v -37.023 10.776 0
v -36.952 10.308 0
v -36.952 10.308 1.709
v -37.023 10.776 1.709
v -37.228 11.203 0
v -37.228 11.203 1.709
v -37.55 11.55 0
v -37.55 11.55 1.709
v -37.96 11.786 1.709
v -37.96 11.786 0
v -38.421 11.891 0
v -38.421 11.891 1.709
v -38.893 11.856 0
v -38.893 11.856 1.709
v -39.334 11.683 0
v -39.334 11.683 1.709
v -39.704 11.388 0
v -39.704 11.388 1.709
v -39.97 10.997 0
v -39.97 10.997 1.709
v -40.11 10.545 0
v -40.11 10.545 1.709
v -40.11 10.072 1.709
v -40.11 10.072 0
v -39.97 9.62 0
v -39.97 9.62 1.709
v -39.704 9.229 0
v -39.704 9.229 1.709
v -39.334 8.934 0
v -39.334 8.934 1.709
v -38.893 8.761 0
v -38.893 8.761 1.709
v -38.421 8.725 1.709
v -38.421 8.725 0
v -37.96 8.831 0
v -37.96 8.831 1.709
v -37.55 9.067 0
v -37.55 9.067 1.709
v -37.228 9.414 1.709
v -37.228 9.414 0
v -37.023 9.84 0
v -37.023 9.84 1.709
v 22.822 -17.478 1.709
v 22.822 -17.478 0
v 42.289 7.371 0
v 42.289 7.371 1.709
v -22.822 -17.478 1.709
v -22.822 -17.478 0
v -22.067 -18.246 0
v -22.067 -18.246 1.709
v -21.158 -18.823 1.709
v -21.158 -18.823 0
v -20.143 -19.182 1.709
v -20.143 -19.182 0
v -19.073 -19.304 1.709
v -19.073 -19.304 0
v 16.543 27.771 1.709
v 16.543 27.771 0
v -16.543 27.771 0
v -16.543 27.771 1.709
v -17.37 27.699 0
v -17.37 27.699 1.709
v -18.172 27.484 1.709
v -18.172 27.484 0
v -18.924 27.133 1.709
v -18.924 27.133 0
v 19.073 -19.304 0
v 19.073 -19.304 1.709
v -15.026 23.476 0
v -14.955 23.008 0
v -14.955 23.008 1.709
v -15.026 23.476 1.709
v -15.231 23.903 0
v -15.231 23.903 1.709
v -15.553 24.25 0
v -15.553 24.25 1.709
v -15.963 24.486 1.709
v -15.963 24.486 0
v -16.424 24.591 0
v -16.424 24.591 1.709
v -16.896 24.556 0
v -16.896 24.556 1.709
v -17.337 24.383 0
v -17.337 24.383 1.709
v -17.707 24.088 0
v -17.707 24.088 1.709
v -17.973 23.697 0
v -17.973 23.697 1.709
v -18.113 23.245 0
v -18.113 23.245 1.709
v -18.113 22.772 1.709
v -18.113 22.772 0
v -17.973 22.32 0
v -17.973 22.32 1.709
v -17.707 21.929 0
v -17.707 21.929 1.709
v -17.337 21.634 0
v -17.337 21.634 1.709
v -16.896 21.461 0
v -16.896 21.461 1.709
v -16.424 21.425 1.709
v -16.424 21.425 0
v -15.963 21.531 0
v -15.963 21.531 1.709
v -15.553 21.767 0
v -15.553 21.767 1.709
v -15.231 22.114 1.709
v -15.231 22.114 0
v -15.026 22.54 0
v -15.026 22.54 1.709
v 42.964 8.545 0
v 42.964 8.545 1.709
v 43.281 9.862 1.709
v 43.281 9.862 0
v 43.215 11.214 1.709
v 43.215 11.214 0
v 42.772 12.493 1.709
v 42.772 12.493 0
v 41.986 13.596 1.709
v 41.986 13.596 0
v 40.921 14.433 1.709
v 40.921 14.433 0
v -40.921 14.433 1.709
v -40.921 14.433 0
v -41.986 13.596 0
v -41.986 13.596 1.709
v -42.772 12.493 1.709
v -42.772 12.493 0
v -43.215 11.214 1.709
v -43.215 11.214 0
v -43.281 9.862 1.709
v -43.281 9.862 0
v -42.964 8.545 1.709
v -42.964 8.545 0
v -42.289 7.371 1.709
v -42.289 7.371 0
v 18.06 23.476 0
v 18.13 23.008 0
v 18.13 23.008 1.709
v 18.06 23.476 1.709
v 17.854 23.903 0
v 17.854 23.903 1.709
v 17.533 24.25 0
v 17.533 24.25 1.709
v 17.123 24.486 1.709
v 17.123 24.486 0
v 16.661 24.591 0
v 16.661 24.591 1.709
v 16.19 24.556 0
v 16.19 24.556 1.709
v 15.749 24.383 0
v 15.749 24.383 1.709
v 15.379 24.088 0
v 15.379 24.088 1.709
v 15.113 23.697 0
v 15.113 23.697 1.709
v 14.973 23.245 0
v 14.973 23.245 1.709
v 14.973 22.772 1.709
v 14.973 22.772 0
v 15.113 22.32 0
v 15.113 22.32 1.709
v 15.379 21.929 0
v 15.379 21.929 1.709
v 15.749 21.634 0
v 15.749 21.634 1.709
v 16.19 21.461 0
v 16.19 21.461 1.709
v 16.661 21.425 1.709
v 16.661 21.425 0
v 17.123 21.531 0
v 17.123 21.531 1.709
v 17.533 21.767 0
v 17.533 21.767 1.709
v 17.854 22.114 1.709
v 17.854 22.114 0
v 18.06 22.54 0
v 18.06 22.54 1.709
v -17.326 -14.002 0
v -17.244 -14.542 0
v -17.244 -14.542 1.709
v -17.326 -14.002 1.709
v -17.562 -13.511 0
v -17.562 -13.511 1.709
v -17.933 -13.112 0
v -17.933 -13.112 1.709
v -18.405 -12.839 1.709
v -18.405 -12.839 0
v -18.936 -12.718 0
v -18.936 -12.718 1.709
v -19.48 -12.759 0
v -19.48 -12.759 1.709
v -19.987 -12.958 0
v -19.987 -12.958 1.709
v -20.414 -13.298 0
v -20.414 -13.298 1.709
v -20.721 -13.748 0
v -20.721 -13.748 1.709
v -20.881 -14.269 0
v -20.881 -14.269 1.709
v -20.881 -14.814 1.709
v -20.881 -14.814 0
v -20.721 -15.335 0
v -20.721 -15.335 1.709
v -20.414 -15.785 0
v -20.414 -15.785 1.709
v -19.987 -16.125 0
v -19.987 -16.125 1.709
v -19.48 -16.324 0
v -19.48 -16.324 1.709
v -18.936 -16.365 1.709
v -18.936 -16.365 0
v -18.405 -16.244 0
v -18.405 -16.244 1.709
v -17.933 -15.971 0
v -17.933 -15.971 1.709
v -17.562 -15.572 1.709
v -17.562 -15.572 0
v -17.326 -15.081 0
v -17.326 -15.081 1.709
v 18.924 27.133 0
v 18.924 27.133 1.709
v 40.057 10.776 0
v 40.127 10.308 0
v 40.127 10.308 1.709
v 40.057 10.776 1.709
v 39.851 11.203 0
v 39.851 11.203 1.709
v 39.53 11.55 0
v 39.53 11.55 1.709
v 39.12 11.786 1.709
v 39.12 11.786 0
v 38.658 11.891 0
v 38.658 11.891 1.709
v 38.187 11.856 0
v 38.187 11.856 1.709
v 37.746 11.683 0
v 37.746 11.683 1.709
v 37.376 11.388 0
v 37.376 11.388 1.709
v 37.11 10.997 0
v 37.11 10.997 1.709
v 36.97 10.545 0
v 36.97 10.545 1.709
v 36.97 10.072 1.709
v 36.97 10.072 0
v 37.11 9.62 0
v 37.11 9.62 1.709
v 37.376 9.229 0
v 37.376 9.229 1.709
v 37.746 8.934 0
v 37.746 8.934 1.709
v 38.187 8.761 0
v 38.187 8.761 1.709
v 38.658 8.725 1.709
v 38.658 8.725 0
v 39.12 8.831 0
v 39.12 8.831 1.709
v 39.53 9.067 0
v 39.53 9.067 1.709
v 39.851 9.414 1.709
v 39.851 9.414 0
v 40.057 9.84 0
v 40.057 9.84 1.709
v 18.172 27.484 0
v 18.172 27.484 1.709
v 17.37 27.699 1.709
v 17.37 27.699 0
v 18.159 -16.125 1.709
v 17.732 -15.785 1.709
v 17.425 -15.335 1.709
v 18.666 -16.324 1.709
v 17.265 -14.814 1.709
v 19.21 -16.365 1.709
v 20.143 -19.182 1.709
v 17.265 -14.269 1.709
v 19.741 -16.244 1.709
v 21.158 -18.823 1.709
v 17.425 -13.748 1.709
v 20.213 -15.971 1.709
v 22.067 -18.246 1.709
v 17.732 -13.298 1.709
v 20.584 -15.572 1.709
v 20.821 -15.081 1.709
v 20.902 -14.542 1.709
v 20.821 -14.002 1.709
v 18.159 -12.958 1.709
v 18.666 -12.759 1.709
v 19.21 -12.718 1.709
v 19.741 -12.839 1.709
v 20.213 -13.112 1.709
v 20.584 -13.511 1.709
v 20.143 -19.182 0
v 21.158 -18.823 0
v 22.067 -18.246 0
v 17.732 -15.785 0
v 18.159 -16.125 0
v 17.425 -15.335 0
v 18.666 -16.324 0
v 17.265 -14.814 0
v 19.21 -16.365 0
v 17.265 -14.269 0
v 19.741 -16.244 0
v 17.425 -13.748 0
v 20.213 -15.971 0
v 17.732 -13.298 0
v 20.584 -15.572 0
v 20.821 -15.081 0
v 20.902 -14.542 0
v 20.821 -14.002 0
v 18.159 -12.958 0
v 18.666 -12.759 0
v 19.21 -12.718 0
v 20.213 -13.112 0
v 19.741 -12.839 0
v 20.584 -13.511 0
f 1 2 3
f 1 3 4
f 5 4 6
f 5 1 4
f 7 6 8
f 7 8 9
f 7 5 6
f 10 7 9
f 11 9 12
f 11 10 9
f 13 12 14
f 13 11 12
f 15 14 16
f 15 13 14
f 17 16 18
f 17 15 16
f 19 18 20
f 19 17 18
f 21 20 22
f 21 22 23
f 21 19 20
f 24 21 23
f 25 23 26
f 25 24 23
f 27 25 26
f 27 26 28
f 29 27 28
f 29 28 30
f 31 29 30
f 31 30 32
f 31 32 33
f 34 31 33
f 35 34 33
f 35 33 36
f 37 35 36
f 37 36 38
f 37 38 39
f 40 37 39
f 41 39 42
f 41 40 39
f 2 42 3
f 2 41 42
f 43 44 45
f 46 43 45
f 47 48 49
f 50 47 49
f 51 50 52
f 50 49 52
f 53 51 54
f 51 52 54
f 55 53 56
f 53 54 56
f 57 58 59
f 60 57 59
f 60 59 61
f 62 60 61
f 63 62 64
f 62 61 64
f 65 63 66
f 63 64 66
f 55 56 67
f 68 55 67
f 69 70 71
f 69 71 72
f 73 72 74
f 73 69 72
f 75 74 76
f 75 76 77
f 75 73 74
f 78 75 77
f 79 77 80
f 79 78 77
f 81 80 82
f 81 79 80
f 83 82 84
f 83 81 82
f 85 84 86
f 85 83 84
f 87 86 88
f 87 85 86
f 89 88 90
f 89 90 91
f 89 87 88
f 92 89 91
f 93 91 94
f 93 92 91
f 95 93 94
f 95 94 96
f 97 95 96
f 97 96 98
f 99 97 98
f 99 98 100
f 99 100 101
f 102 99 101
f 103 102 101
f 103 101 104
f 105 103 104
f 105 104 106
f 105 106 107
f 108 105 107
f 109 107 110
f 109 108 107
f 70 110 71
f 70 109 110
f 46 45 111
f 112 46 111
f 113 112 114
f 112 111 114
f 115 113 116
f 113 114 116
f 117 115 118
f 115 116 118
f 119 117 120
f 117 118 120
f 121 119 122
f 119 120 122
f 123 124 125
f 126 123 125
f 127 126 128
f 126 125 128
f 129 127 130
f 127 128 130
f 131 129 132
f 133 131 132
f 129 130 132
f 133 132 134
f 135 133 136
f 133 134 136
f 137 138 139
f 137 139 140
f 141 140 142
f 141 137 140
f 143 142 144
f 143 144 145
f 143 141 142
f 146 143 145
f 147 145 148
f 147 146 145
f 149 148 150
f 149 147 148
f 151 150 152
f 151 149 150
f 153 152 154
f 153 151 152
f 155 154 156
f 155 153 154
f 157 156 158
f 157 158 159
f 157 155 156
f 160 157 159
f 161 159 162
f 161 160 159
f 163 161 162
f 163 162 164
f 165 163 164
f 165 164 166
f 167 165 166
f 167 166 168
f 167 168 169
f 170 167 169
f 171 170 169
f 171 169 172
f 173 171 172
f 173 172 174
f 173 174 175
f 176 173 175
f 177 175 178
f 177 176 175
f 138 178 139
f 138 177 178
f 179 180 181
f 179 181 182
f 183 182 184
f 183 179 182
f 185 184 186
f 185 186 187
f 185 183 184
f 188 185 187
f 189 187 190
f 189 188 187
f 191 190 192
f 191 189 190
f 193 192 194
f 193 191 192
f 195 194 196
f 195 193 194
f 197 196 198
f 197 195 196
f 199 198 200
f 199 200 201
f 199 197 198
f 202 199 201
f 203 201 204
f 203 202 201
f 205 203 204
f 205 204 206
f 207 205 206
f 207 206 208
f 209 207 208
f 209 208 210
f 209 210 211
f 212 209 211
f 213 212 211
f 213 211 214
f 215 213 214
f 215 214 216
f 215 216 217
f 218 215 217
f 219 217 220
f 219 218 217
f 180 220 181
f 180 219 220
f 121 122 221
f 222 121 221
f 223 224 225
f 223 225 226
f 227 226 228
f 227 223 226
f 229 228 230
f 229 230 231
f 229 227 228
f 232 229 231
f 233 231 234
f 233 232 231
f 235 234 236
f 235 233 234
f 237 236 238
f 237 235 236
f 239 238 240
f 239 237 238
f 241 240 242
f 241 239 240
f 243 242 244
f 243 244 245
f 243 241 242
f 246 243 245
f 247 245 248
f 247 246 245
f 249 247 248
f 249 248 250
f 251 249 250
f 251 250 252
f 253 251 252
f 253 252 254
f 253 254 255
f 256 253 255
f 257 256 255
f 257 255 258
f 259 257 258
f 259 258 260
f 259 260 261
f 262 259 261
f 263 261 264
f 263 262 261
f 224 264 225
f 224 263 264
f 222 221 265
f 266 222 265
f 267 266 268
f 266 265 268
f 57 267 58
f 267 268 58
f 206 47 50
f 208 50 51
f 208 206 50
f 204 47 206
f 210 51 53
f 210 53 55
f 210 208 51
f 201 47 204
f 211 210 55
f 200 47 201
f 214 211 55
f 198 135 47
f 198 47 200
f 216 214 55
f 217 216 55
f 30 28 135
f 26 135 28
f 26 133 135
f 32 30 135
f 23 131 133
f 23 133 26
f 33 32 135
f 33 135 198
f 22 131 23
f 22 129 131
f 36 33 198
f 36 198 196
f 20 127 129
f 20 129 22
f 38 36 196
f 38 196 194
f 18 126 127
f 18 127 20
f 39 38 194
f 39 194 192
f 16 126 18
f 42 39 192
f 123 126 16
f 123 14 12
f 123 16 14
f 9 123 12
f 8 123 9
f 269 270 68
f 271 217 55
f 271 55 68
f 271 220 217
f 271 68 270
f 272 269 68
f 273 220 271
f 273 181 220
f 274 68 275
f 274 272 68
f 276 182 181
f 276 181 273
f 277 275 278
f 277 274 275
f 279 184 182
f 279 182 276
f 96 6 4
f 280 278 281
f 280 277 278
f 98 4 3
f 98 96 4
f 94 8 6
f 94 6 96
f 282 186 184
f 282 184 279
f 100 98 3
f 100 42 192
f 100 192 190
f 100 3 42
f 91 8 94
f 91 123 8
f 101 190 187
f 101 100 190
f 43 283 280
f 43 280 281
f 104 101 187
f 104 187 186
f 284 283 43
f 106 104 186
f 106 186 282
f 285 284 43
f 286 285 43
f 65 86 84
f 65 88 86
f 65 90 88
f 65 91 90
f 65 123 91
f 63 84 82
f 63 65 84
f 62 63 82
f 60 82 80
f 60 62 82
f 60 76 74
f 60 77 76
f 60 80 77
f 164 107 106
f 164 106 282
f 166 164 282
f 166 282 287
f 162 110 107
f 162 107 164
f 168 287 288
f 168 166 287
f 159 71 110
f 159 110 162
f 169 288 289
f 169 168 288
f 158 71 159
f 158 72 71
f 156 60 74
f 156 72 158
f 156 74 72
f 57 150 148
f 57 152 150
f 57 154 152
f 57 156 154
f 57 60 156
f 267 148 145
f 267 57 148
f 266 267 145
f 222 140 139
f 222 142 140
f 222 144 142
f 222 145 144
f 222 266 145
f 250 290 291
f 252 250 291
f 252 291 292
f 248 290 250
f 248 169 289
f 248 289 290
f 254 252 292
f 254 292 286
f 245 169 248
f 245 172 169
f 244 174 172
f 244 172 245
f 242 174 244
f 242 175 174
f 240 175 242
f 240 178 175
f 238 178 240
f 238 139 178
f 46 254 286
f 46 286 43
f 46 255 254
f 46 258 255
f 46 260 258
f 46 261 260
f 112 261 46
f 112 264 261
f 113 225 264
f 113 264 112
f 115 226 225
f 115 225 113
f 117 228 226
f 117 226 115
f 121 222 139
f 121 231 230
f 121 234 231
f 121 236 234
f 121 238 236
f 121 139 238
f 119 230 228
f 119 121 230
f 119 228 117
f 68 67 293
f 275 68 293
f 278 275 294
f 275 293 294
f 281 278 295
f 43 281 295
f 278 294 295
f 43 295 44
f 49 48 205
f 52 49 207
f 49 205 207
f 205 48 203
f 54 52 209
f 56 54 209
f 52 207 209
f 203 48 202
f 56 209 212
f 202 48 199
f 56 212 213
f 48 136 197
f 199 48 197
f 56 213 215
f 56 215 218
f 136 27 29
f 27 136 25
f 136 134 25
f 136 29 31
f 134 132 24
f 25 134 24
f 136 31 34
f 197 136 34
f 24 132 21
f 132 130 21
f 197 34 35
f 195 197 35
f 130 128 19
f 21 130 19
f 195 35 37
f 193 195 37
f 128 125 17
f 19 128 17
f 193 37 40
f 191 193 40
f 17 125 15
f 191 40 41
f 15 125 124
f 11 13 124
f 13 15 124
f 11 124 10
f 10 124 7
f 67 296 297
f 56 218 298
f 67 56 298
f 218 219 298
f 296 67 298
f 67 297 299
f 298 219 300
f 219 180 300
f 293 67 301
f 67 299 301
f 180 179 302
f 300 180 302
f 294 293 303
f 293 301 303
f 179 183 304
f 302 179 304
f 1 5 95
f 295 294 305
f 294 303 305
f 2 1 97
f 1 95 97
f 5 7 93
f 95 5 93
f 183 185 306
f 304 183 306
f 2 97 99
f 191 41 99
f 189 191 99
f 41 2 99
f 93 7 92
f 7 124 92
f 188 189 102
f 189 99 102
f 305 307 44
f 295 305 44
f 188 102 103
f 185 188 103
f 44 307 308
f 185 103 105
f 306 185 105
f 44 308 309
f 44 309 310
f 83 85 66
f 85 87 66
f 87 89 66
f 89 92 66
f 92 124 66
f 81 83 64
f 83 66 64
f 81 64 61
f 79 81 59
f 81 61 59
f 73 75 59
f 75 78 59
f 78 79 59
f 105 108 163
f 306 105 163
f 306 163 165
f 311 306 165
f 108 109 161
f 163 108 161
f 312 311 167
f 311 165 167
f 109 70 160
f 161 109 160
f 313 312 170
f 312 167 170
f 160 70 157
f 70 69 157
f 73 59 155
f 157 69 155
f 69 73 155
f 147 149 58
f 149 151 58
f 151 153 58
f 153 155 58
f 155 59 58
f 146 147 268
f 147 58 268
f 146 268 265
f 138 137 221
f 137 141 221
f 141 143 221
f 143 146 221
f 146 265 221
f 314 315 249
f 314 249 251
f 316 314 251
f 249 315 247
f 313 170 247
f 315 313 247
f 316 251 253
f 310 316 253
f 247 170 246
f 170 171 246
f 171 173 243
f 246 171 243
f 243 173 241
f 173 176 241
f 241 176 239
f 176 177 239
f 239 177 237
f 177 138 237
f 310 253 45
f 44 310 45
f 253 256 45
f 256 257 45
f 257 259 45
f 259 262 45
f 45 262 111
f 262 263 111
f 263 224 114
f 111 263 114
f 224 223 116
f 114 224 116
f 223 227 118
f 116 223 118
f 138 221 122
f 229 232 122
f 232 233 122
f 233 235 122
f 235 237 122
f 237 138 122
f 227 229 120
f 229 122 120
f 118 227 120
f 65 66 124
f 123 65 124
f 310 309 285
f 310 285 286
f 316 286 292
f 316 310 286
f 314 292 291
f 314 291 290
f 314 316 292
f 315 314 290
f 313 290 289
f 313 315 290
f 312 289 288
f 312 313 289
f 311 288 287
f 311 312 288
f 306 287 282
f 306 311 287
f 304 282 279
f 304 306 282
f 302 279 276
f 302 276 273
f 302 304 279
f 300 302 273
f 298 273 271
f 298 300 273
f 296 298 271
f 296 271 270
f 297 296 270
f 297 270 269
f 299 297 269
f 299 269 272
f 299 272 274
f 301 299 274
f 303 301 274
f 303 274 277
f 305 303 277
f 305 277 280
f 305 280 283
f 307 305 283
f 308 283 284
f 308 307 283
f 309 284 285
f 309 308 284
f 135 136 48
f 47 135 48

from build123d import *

# Parameters (mm, degrees)
F0_R     = 1.8288
F0_R_2   = 1.5875
F1_DEPTH = 1.70942


with BuildPart() as f1:
    # F0 (on Top) → F1 (new body)
    with BuildSketch(Plane.XY):
        with BuildLine():
            Line((16.542796, 27.770879), (-16.542796, 27.770879))
            ThreePointArc((-16.542796, 27.770879), (-17.775421, 27.608601), (-18.924046, 27.132825))
            Line((-18.924046, 27.132825), (-40.921091, 14.432825))
            ThreePointArc((-40.921091, 14.432825), (-43.215428, 11.214078), (-42.288939, 7.371431))
            Line((-42.288939, 7.371431), (-22.822177, -17.478448))
            ThreePointArc((-22.822177, -17.478448), (-21.158047, -18.823358), (-19.073079, -19.304))
            Line((-19.073079, -19.304), (19.073079, -19.304))
            ThreePointArc((19.073079, -19.304), (21.158047, -18.823358), (22.822177, -17.478448))
            Line((22.822177, -17.478448), (42.288939, 7.371431))
            ThreePointArc((42.288939, 7.371431), (43.215428, 11.214078), (40.921091, 14.432825))
            Line((40.921091, 14.432825), (18.924046, 27.132825))
            ThreePointArc((18.924046, 27.132825), (17.775421, 27.608601), (16.542796, 27.770879))
        make_face()
        with Locations((-19.073079, -14.5415)):
            Circle(F0_R, mode=Mode.SUBTRACT)
        with Locations((19.073079, -14.5415)):
            Circle(F0_R, mode=Mode.SUBTRACT)
        with Locations((-38.539841, 10.308379)):
            Circle(F0_R_2, mode=Mode.SUBTRACT)
        with Locations((-16.542796, 23.008379)):
            Circle(F0_R_2, mode=Mode.SUBTRACT)
        with Locations((38.539841, 10.308379)):
            Circle(F0_R_2, mode=Mode.SUBTRACT)
        with Locations((16.542796, 23.008379)):
            Circle(F0_R_2, mode=Mode.SUBTRACT)
    extrude(amount=F1_DEPTH)


solid = f1.part
